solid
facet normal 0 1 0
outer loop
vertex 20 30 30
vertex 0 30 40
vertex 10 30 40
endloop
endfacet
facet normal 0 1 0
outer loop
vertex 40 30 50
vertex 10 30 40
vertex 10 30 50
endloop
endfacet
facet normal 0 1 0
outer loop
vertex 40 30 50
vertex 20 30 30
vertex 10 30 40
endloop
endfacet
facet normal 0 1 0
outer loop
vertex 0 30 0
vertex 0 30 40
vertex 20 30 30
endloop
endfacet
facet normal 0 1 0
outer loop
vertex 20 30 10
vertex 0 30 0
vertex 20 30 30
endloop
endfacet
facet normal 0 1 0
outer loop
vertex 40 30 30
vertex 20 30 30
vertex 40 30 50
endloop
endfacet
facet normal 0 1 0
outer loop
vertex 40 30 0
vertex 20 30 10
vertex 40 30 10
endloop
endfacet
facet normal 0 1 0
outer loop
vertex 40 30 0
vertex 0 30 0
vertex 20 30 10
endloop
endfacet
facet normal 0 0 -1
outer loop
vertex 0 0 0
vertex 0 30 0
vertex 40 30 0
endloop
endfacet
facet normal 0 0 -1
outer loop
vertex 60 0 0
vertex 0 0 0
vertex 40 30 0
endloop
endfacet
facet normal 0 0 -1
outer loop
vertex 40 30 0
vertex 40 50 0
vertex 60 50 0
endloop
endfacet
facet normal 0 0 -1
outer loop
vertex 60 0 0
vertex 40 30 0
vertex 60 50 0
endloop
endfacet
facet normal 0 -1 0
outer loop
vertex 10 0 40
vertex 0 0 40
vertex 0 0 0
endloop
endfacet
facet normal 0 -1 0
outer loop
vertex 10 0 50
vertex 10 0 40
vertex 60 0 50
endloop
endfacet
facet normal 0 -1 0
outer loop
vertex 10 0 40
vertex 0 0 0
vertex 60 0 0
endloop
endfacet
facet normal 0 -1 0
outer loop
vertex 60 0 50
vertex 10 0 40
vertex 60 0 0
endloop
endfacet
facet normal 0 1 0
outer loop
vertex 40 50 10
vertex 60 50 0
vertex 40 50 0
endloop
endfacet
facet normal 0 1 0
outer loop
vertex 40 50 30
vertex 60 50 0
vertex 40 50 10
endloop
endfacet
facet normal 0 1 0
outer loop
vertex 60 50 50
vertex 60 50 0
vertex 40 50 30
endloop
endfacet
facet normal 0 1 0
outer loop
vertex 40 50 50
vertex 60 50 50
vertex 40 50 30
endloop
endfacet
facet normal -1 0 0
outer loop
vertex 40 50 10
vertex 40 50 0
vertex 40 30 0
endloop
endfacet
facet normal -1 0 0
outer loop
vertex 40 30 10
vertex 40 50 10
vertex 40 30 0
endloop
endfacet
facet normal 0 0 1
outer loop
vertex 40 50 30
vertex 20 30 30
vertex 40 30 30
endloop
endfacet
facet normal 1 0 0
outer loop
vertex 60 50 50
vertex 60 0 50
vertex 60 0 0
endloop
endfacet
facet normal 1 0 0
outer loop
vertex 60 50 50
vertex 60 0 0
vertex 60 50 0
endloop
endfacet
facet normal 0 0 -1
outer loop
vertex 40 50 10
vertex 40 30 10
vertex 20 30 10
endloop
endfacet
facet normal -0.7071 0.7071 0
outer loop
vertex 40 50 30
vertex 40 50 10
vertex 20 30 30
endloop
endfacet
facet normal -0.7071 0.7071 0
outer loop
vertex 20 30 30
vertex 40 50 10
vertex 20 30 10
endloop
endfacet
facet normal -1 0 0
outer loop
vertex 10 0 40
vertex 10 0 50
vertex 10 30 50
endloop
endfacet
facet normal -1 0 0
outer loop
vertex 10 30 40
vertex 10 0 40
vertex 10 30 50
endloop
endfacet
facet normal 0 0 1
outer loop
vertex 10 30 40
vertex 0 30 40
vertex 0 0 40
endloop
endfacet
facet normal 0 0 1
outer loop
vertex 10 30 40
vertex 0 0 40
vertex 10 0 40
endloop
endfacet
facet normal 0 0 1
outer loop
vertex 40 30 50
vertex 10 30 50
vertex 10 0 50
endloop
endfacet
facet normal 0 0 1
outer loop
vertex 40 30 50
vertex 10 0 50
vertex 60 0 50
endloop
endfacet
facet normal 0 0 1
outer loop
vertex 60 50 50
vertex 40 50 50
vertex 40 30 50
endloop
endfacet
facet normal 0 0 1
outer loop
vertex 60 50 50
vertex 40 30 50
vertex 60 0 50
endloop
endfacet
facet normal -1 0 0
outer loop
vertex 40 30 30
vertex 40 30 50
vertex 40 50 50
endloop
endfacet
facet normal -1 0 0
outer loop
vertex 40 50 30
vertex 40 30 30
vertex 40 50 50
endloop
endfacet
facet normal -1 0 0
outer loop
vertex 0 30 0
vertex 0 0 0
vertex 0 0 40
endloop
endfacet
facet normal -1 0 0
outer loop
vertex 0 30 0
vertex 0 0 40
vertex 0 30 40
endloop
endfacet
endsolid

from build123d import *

# Parameters (mm, degrees)
SKETCH1_W           = 60
SKETCH1_H           = 30
BOSS_EXTRUDE1_DEPTH = 50
BOSS_EXTRUDE2_DEPTH = 50
SKETCH3_W           = 10
SKETCH3_H           = 30
CUT_EXTRUDE1_DEPTH  = 10
CUT_EXTRUDE2_DEPTH  = 30
CUT_EXTRUDE3_DEPTH  = 10
BOSS_EXTRUDE3_DEPTH = 10


with BuildPart() as part:
    # Sketch1 → Boss-Extrude1 (new body)
    with BuildSketch(Plane.XY):
        with Locations((30, 15)):
            Rectangle(SKETCH1_W, SKETCH1_H)
    extrude(amount=BOSS_EXTRUDE1_DEPTH)

    # Sketch2 → Boss-Extrude2 (add)
    with BuildSketch(Plane.XY.offset(50)):
        Polygon((60, 30), (60, 50), (40, 50), (20, 30), align=None)
    extrude(amount=-BOSS_EXTRUDE2_DEPTH)

    # Sketch3 → Cut-Extrude1 (cut)
    with BuildSketch(Plane.XY.offset(50)):
        with Locations((5, 15)):
            Rectangle(SKETCH3_W, SKETCH3_H)
    extrude(amount=-CUT_EXTRUDE1_DEPTH, mode=Mode.SUBTRACT)

    # Sketch4 → Cut-Extrude2 (cut)
    with BuildSketch(Plane.XY.offset(50)):
        Polygon((40, 50), (20, 30), (40, 30), align=None)
    extrude(amount=-CUT_EXTRUDE2_DEPTH, mode=Mode.SUBTRACT)

    # Sketch5 → Cut-Extrude3 (cut)
    with BuildSketch(Plane(origin=(0, 0, 0), x_dir=(-1, 0, 0), z_dir=(0, 0, -1))):
        Polygon((-20, 30), (-40, 50), (-40, 30), align=None)
    extrude(amount=-CUT_EXTRUDE3_DEPTH, mode=Mode.SUBTRACT)

    # Sketch6 → Boss-Extrude3 (add)
    with BuildSketch(Plane.XY.offset(20)):
        Polygon((20, 30), (40, 30), (40, 50), align=None)
    extrude(amount=BOSS_EXTRUDE3_DEPTH)


solid = part.part
